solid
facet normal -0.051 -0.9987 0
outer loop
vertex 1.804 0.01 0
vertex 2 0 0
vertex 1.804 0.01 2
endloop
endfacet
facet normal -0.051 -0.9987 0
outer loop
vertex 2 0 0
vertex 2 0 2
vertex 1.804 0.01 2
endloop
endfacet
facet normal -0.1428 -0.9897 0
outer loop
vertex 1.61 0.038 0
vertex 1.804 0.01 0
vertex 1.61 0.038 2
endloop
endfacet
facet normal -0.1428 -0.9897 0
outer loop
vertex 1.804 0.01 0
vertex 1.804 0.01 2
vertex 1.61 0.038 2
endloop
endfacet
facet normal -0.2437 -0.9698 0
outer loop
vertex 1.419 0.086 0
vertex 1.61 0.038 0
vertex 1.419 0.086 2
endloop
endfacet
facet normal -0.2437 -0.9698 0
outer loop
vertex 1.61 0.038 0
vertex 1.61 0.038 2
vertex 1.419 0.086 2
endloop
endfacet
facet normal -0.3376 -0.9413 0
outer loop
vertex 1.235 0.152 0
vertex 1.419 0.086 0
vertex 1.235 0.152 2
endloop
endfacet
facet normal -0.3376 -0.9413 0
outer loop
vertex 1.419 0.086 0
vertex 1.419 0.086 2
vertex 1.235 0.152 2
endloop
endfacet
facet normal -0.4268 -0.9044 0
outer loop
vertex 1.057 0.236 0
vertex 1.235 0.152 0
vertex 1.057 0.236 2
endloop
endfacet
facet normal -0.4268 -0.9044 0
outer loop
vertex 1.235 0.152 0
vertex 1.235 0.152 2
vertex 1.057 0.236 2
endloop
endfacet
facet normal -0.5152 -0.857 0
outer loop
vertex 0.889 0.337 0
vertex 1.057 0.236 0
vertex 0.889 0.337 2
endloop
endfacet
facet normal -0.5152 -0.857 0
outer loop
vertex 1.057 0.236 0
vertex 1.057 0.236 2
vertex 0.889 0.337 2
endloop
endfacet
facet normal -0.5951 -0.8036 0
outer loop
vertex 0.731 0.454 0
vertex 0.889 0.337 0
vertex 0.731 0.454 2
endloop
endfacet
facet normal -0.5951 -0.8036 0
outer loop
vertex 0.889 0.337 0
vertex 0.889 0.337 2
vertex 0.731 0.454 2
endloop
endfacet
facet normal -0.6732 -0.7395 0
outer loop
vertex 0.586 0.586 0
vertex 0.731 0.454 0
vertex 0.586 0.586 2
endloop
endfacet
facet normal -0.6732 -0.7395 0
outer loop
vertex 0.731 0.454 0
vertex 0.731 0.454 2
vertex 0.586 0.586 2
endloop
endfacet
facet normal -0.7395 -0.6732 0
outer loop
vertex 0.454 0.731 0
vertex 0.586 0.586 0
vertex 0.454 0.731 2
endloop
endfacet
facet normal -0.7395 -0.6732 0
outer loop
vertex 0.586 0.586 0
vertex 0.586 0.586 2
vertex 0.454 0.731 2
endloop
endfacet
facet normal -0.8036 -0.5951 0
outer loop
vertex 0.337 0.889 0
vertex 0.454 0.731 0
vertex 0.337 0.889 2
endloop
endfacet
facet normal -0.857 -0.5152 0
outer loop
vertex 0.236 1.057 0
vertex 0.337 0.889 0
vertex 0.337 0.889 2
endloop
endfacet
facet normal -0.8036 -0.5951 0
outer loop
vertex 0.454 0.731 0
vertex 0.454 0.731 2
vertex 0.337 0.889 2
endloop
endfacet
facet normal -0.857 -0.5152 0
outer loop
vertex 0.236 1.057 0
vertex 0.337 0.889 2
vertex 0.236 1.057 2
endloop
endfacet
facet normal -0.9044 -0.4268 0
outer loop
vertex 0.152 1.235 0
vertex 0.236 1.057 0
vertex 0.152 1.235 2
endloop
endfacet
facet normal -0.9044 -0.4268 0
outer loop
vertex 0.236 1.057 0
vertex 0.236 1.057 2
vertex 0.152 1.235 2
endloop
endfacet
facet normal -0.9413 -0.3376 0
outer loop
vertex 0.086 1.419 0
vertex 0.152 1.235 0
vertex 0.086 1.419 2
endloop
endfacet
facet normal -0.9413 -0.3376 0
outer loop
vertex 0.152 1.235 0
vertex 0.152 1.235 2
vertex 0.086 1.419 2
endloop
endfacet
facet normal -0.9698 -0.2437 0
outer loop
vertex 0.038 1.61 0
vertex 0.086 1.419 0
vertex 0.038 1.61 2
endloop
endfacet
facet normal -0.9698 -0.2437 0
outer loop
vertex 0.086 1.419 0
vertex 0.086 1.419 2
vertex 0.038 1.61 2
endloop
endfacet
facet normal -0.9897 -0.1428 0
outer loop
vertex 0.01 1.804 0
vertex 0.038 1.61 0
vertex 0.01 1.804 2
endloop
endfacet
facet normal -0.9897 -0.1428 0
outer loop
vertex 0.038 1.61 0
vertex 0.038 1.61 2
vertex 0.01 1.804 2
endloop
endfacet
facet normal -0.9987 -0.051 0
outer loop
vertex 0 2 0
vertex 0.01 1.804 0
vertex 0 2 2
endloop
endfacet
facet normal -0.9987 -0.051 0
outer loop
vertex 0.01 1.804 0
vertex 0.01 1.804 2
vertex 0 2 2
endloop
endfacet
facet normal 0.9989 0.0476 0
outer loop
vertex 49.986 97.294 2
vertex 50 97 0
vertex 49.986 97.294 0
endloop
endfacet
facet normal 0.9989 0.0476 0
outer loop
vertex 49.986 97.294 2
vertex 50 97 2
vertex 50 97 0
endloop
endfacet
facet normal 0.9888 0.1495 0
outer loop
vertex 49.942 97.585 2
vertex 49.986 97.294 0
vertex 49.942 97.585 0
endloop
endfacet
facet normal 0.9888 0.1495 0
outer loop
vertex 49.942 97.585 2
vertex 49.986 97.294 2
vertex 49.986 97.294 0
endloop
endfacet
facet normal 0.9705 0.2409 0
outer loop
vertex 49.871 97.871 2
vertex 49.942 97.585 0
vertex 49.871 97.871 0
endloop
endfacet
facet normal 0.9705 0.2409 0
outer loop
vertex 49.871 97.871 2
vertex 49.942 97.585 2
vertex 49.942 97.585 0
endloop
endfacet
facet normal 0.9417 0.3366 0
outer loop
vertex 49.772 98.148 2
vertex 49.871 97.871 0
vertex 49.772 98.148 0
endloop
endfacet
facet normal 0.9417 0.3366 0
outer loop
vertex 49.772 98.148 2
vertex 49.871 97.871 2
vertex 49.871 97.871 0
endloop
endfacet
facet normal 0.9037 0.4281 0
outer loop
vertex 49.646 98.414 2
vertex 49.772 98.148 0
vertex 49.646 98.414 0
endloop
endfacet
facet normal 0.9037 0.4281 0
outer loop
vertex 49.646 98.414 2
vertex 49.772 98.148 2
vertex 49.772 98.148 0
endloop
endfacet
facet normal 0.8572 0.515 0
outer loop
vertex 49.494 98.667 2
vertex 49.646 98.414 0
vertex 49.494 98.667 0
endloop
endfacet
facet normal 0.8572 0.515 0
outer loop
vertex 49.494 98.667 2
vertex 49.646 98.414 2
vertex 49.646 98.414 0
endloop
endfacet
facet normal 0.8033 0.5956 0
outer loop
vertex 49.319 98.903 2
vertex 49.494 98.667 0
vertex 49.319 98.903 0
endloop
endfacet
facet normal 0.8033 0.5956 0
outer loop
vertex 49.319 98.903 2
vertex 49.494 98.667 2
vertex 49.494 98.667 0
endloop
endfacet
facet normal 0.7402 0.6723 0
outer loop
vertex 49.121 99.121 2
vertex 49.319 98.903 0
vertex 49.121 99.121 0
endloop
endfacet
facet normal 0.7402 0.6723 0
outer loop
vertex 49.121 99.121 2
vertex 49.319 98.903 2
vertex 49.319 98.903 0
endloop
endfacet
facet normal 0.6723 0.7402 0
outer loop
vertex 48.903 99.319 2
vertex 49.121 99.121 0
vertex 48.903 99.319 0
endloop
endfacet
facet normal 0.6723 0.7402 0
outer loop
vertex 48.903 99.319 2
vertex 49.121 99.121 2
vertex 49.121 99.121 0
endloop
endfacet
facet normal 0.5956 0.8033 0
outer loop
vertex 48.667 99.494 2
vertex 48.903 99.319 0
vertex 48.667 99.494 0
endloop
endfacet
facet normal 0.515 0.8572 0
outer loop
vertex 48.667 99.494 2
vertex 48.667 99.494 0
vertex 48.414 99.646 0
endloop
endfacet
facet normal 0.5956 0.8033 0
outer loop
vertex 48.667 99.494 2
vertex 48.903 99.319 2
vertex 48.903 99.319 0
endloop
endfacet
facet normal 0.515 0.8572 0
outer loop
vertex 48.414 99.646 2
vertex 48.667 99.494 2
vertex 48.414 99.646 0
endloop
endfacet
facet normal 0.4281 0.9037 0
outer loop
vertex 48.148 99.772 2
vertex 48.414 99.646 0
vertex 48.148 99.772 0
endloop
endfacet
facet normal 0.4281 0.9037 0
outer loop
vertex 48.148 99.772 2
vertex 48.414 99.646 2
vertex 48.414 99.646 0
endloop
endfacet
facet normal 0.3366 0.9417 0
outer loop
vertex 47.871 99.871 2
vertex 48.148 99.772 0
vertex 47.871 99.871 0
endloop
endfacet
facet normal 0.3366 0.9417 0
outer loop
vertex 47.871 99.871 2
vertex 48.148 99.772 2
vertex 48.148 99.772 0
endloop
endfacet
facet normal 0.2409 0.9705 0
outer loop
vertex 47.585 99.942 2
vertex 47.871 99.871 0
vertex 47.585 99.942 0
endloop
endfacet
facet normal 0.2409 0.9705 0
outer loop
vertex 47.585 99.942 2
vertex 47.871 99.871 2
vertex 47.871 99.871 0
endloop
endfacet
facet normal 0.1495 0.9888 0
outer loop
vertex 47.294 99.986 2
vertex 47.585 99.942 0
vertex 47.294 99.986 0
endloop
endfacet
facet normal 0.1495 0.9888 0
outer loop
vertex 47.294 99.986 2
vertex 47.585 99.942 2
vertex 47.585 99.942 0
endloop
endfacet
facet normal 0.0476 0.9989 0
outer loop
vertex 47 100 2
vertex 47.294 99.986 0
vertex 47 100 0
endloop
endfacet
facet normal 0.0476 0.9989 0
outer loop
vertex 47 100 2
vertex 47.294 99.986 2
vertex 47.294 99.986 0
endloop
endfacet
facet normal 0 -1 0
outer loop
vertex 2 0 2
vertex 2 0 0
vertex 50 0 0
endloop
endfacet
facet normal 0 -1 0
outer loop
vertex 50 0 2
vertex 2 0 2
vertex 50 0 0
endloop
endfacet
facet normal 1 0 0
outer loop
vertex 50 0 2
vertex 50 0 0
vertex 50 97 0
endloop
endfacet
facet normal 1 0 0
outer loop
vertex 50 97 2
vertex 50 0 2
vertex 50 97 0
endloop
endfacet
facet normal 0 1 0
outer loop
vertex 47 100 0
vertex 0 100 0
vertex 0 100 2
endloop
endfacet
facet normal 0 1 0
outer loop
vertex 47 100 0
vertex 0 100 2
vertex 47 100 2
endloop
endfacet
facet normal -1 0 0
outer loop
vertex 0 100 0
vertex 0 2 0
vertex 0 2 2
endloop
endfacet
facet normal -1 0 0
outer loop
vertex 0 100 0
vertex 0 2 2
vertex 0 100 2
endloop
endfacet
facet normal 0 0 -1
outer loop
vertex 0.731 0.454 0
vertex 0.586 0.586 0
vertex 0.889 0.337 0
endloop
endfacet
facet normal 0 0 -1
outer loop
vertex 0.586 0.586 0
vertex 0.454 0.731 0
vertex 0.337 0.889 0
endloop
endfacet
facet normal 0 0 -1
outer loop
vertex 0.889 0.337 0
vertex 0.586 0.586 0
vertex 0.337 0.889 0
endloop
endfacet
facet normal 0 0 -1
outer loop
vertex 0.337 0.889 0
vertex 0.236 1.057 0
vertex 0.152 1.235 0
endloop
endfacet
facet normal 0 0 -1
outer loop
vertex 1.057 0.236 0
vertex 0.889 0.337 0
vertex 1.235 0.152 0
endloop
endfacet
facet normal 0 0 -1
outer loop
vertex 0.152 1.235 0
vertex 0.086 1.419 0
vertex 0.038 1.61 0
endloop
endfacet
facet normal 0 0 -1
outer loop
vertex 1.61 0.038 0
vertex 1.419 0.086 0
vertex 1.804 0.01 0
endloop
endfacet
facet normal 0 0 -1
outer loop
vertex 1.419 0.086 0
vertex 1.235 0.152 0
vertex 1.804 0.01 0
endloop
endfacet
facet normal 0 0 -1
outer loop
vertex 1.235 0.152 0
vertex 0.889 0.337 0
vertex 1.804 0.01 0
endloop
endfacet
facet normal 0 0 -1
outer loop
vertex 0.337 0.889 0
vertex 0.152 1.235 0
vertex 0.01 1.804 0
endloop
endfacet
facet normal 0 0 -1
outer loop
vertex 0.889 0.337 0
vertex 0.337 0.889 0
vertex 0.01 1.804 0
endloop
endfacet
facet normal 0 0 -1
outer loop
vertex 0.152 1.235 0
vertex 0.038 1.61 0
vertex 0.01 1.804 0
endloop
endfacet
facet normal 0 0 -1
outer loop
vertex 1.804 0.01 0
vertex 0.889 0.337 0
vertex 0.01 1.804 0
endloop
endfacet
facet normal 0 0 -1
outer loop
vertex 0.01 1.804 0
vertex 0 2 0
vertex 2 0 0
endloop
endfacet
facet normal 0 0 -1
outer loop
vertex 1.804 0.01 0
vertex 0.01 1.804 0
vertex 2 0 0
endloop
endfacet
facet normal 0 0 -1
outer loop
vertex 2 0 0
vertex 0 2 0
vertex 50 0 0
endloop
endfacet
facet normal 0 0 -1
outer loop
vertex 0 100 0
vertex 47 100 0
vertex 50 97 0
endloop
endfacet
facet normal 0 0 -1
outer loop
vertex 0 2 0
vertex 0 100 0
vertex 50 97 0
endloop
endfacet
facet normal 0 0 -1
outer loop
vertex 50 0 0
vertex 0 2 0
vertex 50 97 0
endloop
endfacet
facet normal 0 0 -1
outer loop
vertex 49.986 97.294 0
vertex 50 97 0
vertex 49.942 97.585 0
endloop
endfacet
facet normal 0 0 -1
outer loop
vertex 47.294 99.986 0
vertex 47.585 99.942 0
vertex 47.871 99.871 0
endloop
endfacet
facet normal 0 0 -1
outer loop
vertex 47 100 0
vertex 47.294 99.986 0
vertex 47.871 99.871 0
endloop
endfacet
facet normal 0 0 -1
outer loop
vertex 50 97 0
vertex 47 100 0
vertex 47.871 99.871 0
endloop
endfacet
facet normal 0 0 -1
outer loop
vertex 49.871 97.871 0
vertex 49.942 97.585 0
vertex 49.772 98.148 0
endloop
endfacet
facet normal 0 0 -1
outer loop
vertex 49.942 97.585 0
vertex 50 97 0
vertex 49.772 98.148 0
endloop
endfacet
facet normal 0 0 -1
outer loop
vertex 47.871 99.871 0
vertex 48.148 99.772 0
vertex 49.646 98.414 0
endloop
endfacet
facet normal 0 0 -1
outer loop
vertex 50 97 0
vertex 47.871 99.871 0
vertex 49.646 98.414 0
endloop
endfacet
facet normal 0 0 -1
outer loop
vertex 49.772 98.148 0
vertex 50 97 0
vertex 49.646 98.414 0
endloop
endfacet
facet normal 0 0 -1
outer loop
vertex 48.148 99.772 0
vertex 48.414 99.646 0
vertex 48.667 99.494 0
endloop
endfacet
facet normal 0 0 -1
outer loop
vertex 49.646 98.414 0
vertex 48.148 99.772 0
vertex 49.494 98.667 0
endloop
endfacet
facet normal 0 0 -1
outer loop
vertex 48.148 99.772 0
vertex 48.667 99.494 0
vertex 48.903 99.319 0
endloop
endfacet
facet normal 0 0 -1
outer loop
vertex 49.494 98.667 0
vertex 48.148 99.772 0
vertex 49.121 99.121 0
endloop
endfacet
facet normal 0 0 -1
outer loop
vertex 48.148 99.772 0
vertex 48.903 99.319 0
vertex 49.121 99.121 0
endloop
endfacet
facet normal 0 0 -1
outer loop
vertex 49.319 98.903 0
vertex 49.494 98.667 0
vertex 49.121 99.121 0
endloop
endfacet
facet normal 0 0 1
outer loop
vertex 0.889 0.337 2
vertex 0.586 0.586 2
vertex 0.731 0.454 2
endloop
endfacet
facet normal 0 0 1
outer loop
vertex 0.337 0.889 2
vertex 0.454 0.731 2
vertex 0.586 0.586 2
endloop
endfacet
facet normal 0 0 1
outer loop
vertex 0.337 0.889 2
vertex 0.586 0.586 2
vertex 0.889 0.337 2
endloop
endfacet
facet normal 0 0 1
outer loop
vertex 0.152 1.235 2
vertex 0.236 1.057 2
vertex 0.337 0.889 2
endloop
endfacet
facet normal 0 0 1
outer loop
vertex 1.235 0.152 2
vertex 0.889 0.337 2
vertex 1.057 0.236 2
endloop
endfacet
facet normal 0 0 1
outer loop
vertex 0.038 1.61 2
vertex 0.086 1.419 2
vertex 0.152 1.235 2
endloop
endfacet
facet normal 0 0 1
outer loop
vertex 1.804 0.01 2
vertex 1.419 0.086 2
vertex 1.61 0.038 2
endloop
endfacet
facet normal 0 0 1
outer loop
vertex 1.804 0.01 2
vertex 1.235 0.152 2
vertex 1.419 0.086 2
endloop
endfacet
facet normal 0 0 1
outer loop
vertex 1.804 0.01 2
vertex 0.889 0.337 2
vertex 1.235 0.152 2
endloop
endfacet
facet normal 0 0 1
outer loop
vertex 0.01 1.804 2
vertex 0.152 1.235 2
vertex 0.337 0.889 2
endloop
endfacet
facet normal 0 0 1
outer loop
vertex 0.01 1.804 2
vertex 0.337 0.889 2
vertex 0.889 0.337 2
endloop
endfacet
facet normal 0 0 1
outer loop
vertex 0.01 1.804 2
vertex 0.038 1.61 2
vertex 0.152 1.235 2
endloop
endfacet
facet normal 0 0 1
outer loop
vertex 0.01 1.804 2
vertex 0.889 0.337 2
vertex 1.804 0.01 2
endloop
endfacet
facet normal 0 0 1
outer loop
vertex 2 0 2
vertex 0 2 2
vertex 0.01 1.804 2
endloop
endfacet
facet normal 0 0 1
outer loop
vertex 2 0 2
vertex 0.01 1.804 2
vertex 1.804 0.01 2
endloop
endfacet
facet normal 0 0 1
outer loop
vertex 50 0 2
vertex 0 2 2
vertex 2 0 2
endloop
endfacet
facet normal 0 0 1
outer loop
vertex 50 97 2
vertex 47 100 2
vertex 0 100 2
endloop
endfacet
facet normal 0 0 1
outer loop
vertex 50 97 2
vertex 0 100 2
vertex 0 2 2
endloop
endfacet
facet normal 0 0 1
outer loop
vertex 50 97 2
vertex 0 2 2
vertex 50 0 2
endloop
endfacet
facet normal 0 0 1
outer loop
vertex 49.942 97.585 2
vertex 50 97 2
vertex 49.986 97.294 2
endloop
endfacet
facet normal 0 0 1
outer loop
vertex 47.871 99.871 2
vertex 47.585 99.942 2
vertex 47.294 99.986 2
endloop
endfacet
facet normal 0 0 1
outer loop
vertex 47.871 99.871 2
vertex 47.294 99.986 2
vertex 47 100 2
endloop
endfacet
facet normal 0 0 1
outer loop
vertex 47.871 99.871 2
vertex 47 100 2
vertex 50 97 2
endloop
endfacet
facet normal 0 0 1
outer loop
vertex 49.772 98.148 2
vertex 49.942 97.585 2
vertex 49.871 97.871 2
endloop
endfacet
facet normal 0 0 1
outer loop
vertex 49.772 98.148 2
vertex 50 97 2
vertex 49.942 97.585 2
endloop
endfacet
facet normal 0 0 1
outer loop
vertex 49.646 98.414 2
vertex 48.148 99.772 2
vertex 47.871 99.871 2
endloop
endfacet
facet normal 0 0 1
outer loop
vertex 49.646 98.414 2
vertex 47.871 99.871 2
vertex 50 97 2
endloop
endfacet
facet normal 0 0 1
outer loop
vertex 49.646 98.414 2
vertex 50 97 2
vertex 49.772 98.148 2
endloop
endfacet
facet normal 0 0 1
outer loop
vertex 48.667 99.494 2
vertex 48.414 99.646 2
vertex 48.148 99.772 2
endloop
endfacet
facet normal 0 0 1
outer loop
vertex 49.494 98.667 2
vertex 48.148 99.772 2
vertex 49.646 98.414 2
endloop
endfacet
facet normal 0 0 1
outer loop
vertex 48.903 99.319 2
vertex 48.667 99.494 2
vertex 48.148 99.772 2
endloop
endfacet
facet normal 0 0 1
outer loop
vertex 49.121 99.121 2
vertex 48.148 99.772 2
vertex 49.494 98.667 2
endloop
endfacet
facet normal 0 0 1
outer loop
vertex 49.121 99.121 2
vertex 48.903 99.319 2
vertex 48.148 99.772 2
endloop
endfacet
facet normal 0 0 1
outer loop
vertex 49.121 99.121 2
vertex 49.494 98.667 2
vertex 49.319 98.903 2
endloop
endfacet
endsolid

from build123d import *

# Parameters (mm, degrees)
BOX_W       = 50
BOX_H       = 100
BOX_DEPTH   = 2
FILLET_R    = 3
FILLET001_R = 2


with BuildPart() as part:
    # Box → Box (new body)
    with BuildSketch(Plane.XY):
        with Locations((25, 50)):
            Rectangle(BOX_W, BOX_H)
    extrude(amount=BOX_DEPTH)

    # Fillet
    fillet_edges = [part.edges().sort_by_distance(p)[0] for p in [
        (50, 100, 1),
    ]]
    fillet(fillet_edges, radius=FILLET_R)

    # Fillet001
    fillet001_edges = [part.edges().sort_by_distance(p)[0] for p in [
        (0, 0, 1),
    ]]
    fillet(fillet001_edges, radius=FILLET001_R)


solid = part.part
